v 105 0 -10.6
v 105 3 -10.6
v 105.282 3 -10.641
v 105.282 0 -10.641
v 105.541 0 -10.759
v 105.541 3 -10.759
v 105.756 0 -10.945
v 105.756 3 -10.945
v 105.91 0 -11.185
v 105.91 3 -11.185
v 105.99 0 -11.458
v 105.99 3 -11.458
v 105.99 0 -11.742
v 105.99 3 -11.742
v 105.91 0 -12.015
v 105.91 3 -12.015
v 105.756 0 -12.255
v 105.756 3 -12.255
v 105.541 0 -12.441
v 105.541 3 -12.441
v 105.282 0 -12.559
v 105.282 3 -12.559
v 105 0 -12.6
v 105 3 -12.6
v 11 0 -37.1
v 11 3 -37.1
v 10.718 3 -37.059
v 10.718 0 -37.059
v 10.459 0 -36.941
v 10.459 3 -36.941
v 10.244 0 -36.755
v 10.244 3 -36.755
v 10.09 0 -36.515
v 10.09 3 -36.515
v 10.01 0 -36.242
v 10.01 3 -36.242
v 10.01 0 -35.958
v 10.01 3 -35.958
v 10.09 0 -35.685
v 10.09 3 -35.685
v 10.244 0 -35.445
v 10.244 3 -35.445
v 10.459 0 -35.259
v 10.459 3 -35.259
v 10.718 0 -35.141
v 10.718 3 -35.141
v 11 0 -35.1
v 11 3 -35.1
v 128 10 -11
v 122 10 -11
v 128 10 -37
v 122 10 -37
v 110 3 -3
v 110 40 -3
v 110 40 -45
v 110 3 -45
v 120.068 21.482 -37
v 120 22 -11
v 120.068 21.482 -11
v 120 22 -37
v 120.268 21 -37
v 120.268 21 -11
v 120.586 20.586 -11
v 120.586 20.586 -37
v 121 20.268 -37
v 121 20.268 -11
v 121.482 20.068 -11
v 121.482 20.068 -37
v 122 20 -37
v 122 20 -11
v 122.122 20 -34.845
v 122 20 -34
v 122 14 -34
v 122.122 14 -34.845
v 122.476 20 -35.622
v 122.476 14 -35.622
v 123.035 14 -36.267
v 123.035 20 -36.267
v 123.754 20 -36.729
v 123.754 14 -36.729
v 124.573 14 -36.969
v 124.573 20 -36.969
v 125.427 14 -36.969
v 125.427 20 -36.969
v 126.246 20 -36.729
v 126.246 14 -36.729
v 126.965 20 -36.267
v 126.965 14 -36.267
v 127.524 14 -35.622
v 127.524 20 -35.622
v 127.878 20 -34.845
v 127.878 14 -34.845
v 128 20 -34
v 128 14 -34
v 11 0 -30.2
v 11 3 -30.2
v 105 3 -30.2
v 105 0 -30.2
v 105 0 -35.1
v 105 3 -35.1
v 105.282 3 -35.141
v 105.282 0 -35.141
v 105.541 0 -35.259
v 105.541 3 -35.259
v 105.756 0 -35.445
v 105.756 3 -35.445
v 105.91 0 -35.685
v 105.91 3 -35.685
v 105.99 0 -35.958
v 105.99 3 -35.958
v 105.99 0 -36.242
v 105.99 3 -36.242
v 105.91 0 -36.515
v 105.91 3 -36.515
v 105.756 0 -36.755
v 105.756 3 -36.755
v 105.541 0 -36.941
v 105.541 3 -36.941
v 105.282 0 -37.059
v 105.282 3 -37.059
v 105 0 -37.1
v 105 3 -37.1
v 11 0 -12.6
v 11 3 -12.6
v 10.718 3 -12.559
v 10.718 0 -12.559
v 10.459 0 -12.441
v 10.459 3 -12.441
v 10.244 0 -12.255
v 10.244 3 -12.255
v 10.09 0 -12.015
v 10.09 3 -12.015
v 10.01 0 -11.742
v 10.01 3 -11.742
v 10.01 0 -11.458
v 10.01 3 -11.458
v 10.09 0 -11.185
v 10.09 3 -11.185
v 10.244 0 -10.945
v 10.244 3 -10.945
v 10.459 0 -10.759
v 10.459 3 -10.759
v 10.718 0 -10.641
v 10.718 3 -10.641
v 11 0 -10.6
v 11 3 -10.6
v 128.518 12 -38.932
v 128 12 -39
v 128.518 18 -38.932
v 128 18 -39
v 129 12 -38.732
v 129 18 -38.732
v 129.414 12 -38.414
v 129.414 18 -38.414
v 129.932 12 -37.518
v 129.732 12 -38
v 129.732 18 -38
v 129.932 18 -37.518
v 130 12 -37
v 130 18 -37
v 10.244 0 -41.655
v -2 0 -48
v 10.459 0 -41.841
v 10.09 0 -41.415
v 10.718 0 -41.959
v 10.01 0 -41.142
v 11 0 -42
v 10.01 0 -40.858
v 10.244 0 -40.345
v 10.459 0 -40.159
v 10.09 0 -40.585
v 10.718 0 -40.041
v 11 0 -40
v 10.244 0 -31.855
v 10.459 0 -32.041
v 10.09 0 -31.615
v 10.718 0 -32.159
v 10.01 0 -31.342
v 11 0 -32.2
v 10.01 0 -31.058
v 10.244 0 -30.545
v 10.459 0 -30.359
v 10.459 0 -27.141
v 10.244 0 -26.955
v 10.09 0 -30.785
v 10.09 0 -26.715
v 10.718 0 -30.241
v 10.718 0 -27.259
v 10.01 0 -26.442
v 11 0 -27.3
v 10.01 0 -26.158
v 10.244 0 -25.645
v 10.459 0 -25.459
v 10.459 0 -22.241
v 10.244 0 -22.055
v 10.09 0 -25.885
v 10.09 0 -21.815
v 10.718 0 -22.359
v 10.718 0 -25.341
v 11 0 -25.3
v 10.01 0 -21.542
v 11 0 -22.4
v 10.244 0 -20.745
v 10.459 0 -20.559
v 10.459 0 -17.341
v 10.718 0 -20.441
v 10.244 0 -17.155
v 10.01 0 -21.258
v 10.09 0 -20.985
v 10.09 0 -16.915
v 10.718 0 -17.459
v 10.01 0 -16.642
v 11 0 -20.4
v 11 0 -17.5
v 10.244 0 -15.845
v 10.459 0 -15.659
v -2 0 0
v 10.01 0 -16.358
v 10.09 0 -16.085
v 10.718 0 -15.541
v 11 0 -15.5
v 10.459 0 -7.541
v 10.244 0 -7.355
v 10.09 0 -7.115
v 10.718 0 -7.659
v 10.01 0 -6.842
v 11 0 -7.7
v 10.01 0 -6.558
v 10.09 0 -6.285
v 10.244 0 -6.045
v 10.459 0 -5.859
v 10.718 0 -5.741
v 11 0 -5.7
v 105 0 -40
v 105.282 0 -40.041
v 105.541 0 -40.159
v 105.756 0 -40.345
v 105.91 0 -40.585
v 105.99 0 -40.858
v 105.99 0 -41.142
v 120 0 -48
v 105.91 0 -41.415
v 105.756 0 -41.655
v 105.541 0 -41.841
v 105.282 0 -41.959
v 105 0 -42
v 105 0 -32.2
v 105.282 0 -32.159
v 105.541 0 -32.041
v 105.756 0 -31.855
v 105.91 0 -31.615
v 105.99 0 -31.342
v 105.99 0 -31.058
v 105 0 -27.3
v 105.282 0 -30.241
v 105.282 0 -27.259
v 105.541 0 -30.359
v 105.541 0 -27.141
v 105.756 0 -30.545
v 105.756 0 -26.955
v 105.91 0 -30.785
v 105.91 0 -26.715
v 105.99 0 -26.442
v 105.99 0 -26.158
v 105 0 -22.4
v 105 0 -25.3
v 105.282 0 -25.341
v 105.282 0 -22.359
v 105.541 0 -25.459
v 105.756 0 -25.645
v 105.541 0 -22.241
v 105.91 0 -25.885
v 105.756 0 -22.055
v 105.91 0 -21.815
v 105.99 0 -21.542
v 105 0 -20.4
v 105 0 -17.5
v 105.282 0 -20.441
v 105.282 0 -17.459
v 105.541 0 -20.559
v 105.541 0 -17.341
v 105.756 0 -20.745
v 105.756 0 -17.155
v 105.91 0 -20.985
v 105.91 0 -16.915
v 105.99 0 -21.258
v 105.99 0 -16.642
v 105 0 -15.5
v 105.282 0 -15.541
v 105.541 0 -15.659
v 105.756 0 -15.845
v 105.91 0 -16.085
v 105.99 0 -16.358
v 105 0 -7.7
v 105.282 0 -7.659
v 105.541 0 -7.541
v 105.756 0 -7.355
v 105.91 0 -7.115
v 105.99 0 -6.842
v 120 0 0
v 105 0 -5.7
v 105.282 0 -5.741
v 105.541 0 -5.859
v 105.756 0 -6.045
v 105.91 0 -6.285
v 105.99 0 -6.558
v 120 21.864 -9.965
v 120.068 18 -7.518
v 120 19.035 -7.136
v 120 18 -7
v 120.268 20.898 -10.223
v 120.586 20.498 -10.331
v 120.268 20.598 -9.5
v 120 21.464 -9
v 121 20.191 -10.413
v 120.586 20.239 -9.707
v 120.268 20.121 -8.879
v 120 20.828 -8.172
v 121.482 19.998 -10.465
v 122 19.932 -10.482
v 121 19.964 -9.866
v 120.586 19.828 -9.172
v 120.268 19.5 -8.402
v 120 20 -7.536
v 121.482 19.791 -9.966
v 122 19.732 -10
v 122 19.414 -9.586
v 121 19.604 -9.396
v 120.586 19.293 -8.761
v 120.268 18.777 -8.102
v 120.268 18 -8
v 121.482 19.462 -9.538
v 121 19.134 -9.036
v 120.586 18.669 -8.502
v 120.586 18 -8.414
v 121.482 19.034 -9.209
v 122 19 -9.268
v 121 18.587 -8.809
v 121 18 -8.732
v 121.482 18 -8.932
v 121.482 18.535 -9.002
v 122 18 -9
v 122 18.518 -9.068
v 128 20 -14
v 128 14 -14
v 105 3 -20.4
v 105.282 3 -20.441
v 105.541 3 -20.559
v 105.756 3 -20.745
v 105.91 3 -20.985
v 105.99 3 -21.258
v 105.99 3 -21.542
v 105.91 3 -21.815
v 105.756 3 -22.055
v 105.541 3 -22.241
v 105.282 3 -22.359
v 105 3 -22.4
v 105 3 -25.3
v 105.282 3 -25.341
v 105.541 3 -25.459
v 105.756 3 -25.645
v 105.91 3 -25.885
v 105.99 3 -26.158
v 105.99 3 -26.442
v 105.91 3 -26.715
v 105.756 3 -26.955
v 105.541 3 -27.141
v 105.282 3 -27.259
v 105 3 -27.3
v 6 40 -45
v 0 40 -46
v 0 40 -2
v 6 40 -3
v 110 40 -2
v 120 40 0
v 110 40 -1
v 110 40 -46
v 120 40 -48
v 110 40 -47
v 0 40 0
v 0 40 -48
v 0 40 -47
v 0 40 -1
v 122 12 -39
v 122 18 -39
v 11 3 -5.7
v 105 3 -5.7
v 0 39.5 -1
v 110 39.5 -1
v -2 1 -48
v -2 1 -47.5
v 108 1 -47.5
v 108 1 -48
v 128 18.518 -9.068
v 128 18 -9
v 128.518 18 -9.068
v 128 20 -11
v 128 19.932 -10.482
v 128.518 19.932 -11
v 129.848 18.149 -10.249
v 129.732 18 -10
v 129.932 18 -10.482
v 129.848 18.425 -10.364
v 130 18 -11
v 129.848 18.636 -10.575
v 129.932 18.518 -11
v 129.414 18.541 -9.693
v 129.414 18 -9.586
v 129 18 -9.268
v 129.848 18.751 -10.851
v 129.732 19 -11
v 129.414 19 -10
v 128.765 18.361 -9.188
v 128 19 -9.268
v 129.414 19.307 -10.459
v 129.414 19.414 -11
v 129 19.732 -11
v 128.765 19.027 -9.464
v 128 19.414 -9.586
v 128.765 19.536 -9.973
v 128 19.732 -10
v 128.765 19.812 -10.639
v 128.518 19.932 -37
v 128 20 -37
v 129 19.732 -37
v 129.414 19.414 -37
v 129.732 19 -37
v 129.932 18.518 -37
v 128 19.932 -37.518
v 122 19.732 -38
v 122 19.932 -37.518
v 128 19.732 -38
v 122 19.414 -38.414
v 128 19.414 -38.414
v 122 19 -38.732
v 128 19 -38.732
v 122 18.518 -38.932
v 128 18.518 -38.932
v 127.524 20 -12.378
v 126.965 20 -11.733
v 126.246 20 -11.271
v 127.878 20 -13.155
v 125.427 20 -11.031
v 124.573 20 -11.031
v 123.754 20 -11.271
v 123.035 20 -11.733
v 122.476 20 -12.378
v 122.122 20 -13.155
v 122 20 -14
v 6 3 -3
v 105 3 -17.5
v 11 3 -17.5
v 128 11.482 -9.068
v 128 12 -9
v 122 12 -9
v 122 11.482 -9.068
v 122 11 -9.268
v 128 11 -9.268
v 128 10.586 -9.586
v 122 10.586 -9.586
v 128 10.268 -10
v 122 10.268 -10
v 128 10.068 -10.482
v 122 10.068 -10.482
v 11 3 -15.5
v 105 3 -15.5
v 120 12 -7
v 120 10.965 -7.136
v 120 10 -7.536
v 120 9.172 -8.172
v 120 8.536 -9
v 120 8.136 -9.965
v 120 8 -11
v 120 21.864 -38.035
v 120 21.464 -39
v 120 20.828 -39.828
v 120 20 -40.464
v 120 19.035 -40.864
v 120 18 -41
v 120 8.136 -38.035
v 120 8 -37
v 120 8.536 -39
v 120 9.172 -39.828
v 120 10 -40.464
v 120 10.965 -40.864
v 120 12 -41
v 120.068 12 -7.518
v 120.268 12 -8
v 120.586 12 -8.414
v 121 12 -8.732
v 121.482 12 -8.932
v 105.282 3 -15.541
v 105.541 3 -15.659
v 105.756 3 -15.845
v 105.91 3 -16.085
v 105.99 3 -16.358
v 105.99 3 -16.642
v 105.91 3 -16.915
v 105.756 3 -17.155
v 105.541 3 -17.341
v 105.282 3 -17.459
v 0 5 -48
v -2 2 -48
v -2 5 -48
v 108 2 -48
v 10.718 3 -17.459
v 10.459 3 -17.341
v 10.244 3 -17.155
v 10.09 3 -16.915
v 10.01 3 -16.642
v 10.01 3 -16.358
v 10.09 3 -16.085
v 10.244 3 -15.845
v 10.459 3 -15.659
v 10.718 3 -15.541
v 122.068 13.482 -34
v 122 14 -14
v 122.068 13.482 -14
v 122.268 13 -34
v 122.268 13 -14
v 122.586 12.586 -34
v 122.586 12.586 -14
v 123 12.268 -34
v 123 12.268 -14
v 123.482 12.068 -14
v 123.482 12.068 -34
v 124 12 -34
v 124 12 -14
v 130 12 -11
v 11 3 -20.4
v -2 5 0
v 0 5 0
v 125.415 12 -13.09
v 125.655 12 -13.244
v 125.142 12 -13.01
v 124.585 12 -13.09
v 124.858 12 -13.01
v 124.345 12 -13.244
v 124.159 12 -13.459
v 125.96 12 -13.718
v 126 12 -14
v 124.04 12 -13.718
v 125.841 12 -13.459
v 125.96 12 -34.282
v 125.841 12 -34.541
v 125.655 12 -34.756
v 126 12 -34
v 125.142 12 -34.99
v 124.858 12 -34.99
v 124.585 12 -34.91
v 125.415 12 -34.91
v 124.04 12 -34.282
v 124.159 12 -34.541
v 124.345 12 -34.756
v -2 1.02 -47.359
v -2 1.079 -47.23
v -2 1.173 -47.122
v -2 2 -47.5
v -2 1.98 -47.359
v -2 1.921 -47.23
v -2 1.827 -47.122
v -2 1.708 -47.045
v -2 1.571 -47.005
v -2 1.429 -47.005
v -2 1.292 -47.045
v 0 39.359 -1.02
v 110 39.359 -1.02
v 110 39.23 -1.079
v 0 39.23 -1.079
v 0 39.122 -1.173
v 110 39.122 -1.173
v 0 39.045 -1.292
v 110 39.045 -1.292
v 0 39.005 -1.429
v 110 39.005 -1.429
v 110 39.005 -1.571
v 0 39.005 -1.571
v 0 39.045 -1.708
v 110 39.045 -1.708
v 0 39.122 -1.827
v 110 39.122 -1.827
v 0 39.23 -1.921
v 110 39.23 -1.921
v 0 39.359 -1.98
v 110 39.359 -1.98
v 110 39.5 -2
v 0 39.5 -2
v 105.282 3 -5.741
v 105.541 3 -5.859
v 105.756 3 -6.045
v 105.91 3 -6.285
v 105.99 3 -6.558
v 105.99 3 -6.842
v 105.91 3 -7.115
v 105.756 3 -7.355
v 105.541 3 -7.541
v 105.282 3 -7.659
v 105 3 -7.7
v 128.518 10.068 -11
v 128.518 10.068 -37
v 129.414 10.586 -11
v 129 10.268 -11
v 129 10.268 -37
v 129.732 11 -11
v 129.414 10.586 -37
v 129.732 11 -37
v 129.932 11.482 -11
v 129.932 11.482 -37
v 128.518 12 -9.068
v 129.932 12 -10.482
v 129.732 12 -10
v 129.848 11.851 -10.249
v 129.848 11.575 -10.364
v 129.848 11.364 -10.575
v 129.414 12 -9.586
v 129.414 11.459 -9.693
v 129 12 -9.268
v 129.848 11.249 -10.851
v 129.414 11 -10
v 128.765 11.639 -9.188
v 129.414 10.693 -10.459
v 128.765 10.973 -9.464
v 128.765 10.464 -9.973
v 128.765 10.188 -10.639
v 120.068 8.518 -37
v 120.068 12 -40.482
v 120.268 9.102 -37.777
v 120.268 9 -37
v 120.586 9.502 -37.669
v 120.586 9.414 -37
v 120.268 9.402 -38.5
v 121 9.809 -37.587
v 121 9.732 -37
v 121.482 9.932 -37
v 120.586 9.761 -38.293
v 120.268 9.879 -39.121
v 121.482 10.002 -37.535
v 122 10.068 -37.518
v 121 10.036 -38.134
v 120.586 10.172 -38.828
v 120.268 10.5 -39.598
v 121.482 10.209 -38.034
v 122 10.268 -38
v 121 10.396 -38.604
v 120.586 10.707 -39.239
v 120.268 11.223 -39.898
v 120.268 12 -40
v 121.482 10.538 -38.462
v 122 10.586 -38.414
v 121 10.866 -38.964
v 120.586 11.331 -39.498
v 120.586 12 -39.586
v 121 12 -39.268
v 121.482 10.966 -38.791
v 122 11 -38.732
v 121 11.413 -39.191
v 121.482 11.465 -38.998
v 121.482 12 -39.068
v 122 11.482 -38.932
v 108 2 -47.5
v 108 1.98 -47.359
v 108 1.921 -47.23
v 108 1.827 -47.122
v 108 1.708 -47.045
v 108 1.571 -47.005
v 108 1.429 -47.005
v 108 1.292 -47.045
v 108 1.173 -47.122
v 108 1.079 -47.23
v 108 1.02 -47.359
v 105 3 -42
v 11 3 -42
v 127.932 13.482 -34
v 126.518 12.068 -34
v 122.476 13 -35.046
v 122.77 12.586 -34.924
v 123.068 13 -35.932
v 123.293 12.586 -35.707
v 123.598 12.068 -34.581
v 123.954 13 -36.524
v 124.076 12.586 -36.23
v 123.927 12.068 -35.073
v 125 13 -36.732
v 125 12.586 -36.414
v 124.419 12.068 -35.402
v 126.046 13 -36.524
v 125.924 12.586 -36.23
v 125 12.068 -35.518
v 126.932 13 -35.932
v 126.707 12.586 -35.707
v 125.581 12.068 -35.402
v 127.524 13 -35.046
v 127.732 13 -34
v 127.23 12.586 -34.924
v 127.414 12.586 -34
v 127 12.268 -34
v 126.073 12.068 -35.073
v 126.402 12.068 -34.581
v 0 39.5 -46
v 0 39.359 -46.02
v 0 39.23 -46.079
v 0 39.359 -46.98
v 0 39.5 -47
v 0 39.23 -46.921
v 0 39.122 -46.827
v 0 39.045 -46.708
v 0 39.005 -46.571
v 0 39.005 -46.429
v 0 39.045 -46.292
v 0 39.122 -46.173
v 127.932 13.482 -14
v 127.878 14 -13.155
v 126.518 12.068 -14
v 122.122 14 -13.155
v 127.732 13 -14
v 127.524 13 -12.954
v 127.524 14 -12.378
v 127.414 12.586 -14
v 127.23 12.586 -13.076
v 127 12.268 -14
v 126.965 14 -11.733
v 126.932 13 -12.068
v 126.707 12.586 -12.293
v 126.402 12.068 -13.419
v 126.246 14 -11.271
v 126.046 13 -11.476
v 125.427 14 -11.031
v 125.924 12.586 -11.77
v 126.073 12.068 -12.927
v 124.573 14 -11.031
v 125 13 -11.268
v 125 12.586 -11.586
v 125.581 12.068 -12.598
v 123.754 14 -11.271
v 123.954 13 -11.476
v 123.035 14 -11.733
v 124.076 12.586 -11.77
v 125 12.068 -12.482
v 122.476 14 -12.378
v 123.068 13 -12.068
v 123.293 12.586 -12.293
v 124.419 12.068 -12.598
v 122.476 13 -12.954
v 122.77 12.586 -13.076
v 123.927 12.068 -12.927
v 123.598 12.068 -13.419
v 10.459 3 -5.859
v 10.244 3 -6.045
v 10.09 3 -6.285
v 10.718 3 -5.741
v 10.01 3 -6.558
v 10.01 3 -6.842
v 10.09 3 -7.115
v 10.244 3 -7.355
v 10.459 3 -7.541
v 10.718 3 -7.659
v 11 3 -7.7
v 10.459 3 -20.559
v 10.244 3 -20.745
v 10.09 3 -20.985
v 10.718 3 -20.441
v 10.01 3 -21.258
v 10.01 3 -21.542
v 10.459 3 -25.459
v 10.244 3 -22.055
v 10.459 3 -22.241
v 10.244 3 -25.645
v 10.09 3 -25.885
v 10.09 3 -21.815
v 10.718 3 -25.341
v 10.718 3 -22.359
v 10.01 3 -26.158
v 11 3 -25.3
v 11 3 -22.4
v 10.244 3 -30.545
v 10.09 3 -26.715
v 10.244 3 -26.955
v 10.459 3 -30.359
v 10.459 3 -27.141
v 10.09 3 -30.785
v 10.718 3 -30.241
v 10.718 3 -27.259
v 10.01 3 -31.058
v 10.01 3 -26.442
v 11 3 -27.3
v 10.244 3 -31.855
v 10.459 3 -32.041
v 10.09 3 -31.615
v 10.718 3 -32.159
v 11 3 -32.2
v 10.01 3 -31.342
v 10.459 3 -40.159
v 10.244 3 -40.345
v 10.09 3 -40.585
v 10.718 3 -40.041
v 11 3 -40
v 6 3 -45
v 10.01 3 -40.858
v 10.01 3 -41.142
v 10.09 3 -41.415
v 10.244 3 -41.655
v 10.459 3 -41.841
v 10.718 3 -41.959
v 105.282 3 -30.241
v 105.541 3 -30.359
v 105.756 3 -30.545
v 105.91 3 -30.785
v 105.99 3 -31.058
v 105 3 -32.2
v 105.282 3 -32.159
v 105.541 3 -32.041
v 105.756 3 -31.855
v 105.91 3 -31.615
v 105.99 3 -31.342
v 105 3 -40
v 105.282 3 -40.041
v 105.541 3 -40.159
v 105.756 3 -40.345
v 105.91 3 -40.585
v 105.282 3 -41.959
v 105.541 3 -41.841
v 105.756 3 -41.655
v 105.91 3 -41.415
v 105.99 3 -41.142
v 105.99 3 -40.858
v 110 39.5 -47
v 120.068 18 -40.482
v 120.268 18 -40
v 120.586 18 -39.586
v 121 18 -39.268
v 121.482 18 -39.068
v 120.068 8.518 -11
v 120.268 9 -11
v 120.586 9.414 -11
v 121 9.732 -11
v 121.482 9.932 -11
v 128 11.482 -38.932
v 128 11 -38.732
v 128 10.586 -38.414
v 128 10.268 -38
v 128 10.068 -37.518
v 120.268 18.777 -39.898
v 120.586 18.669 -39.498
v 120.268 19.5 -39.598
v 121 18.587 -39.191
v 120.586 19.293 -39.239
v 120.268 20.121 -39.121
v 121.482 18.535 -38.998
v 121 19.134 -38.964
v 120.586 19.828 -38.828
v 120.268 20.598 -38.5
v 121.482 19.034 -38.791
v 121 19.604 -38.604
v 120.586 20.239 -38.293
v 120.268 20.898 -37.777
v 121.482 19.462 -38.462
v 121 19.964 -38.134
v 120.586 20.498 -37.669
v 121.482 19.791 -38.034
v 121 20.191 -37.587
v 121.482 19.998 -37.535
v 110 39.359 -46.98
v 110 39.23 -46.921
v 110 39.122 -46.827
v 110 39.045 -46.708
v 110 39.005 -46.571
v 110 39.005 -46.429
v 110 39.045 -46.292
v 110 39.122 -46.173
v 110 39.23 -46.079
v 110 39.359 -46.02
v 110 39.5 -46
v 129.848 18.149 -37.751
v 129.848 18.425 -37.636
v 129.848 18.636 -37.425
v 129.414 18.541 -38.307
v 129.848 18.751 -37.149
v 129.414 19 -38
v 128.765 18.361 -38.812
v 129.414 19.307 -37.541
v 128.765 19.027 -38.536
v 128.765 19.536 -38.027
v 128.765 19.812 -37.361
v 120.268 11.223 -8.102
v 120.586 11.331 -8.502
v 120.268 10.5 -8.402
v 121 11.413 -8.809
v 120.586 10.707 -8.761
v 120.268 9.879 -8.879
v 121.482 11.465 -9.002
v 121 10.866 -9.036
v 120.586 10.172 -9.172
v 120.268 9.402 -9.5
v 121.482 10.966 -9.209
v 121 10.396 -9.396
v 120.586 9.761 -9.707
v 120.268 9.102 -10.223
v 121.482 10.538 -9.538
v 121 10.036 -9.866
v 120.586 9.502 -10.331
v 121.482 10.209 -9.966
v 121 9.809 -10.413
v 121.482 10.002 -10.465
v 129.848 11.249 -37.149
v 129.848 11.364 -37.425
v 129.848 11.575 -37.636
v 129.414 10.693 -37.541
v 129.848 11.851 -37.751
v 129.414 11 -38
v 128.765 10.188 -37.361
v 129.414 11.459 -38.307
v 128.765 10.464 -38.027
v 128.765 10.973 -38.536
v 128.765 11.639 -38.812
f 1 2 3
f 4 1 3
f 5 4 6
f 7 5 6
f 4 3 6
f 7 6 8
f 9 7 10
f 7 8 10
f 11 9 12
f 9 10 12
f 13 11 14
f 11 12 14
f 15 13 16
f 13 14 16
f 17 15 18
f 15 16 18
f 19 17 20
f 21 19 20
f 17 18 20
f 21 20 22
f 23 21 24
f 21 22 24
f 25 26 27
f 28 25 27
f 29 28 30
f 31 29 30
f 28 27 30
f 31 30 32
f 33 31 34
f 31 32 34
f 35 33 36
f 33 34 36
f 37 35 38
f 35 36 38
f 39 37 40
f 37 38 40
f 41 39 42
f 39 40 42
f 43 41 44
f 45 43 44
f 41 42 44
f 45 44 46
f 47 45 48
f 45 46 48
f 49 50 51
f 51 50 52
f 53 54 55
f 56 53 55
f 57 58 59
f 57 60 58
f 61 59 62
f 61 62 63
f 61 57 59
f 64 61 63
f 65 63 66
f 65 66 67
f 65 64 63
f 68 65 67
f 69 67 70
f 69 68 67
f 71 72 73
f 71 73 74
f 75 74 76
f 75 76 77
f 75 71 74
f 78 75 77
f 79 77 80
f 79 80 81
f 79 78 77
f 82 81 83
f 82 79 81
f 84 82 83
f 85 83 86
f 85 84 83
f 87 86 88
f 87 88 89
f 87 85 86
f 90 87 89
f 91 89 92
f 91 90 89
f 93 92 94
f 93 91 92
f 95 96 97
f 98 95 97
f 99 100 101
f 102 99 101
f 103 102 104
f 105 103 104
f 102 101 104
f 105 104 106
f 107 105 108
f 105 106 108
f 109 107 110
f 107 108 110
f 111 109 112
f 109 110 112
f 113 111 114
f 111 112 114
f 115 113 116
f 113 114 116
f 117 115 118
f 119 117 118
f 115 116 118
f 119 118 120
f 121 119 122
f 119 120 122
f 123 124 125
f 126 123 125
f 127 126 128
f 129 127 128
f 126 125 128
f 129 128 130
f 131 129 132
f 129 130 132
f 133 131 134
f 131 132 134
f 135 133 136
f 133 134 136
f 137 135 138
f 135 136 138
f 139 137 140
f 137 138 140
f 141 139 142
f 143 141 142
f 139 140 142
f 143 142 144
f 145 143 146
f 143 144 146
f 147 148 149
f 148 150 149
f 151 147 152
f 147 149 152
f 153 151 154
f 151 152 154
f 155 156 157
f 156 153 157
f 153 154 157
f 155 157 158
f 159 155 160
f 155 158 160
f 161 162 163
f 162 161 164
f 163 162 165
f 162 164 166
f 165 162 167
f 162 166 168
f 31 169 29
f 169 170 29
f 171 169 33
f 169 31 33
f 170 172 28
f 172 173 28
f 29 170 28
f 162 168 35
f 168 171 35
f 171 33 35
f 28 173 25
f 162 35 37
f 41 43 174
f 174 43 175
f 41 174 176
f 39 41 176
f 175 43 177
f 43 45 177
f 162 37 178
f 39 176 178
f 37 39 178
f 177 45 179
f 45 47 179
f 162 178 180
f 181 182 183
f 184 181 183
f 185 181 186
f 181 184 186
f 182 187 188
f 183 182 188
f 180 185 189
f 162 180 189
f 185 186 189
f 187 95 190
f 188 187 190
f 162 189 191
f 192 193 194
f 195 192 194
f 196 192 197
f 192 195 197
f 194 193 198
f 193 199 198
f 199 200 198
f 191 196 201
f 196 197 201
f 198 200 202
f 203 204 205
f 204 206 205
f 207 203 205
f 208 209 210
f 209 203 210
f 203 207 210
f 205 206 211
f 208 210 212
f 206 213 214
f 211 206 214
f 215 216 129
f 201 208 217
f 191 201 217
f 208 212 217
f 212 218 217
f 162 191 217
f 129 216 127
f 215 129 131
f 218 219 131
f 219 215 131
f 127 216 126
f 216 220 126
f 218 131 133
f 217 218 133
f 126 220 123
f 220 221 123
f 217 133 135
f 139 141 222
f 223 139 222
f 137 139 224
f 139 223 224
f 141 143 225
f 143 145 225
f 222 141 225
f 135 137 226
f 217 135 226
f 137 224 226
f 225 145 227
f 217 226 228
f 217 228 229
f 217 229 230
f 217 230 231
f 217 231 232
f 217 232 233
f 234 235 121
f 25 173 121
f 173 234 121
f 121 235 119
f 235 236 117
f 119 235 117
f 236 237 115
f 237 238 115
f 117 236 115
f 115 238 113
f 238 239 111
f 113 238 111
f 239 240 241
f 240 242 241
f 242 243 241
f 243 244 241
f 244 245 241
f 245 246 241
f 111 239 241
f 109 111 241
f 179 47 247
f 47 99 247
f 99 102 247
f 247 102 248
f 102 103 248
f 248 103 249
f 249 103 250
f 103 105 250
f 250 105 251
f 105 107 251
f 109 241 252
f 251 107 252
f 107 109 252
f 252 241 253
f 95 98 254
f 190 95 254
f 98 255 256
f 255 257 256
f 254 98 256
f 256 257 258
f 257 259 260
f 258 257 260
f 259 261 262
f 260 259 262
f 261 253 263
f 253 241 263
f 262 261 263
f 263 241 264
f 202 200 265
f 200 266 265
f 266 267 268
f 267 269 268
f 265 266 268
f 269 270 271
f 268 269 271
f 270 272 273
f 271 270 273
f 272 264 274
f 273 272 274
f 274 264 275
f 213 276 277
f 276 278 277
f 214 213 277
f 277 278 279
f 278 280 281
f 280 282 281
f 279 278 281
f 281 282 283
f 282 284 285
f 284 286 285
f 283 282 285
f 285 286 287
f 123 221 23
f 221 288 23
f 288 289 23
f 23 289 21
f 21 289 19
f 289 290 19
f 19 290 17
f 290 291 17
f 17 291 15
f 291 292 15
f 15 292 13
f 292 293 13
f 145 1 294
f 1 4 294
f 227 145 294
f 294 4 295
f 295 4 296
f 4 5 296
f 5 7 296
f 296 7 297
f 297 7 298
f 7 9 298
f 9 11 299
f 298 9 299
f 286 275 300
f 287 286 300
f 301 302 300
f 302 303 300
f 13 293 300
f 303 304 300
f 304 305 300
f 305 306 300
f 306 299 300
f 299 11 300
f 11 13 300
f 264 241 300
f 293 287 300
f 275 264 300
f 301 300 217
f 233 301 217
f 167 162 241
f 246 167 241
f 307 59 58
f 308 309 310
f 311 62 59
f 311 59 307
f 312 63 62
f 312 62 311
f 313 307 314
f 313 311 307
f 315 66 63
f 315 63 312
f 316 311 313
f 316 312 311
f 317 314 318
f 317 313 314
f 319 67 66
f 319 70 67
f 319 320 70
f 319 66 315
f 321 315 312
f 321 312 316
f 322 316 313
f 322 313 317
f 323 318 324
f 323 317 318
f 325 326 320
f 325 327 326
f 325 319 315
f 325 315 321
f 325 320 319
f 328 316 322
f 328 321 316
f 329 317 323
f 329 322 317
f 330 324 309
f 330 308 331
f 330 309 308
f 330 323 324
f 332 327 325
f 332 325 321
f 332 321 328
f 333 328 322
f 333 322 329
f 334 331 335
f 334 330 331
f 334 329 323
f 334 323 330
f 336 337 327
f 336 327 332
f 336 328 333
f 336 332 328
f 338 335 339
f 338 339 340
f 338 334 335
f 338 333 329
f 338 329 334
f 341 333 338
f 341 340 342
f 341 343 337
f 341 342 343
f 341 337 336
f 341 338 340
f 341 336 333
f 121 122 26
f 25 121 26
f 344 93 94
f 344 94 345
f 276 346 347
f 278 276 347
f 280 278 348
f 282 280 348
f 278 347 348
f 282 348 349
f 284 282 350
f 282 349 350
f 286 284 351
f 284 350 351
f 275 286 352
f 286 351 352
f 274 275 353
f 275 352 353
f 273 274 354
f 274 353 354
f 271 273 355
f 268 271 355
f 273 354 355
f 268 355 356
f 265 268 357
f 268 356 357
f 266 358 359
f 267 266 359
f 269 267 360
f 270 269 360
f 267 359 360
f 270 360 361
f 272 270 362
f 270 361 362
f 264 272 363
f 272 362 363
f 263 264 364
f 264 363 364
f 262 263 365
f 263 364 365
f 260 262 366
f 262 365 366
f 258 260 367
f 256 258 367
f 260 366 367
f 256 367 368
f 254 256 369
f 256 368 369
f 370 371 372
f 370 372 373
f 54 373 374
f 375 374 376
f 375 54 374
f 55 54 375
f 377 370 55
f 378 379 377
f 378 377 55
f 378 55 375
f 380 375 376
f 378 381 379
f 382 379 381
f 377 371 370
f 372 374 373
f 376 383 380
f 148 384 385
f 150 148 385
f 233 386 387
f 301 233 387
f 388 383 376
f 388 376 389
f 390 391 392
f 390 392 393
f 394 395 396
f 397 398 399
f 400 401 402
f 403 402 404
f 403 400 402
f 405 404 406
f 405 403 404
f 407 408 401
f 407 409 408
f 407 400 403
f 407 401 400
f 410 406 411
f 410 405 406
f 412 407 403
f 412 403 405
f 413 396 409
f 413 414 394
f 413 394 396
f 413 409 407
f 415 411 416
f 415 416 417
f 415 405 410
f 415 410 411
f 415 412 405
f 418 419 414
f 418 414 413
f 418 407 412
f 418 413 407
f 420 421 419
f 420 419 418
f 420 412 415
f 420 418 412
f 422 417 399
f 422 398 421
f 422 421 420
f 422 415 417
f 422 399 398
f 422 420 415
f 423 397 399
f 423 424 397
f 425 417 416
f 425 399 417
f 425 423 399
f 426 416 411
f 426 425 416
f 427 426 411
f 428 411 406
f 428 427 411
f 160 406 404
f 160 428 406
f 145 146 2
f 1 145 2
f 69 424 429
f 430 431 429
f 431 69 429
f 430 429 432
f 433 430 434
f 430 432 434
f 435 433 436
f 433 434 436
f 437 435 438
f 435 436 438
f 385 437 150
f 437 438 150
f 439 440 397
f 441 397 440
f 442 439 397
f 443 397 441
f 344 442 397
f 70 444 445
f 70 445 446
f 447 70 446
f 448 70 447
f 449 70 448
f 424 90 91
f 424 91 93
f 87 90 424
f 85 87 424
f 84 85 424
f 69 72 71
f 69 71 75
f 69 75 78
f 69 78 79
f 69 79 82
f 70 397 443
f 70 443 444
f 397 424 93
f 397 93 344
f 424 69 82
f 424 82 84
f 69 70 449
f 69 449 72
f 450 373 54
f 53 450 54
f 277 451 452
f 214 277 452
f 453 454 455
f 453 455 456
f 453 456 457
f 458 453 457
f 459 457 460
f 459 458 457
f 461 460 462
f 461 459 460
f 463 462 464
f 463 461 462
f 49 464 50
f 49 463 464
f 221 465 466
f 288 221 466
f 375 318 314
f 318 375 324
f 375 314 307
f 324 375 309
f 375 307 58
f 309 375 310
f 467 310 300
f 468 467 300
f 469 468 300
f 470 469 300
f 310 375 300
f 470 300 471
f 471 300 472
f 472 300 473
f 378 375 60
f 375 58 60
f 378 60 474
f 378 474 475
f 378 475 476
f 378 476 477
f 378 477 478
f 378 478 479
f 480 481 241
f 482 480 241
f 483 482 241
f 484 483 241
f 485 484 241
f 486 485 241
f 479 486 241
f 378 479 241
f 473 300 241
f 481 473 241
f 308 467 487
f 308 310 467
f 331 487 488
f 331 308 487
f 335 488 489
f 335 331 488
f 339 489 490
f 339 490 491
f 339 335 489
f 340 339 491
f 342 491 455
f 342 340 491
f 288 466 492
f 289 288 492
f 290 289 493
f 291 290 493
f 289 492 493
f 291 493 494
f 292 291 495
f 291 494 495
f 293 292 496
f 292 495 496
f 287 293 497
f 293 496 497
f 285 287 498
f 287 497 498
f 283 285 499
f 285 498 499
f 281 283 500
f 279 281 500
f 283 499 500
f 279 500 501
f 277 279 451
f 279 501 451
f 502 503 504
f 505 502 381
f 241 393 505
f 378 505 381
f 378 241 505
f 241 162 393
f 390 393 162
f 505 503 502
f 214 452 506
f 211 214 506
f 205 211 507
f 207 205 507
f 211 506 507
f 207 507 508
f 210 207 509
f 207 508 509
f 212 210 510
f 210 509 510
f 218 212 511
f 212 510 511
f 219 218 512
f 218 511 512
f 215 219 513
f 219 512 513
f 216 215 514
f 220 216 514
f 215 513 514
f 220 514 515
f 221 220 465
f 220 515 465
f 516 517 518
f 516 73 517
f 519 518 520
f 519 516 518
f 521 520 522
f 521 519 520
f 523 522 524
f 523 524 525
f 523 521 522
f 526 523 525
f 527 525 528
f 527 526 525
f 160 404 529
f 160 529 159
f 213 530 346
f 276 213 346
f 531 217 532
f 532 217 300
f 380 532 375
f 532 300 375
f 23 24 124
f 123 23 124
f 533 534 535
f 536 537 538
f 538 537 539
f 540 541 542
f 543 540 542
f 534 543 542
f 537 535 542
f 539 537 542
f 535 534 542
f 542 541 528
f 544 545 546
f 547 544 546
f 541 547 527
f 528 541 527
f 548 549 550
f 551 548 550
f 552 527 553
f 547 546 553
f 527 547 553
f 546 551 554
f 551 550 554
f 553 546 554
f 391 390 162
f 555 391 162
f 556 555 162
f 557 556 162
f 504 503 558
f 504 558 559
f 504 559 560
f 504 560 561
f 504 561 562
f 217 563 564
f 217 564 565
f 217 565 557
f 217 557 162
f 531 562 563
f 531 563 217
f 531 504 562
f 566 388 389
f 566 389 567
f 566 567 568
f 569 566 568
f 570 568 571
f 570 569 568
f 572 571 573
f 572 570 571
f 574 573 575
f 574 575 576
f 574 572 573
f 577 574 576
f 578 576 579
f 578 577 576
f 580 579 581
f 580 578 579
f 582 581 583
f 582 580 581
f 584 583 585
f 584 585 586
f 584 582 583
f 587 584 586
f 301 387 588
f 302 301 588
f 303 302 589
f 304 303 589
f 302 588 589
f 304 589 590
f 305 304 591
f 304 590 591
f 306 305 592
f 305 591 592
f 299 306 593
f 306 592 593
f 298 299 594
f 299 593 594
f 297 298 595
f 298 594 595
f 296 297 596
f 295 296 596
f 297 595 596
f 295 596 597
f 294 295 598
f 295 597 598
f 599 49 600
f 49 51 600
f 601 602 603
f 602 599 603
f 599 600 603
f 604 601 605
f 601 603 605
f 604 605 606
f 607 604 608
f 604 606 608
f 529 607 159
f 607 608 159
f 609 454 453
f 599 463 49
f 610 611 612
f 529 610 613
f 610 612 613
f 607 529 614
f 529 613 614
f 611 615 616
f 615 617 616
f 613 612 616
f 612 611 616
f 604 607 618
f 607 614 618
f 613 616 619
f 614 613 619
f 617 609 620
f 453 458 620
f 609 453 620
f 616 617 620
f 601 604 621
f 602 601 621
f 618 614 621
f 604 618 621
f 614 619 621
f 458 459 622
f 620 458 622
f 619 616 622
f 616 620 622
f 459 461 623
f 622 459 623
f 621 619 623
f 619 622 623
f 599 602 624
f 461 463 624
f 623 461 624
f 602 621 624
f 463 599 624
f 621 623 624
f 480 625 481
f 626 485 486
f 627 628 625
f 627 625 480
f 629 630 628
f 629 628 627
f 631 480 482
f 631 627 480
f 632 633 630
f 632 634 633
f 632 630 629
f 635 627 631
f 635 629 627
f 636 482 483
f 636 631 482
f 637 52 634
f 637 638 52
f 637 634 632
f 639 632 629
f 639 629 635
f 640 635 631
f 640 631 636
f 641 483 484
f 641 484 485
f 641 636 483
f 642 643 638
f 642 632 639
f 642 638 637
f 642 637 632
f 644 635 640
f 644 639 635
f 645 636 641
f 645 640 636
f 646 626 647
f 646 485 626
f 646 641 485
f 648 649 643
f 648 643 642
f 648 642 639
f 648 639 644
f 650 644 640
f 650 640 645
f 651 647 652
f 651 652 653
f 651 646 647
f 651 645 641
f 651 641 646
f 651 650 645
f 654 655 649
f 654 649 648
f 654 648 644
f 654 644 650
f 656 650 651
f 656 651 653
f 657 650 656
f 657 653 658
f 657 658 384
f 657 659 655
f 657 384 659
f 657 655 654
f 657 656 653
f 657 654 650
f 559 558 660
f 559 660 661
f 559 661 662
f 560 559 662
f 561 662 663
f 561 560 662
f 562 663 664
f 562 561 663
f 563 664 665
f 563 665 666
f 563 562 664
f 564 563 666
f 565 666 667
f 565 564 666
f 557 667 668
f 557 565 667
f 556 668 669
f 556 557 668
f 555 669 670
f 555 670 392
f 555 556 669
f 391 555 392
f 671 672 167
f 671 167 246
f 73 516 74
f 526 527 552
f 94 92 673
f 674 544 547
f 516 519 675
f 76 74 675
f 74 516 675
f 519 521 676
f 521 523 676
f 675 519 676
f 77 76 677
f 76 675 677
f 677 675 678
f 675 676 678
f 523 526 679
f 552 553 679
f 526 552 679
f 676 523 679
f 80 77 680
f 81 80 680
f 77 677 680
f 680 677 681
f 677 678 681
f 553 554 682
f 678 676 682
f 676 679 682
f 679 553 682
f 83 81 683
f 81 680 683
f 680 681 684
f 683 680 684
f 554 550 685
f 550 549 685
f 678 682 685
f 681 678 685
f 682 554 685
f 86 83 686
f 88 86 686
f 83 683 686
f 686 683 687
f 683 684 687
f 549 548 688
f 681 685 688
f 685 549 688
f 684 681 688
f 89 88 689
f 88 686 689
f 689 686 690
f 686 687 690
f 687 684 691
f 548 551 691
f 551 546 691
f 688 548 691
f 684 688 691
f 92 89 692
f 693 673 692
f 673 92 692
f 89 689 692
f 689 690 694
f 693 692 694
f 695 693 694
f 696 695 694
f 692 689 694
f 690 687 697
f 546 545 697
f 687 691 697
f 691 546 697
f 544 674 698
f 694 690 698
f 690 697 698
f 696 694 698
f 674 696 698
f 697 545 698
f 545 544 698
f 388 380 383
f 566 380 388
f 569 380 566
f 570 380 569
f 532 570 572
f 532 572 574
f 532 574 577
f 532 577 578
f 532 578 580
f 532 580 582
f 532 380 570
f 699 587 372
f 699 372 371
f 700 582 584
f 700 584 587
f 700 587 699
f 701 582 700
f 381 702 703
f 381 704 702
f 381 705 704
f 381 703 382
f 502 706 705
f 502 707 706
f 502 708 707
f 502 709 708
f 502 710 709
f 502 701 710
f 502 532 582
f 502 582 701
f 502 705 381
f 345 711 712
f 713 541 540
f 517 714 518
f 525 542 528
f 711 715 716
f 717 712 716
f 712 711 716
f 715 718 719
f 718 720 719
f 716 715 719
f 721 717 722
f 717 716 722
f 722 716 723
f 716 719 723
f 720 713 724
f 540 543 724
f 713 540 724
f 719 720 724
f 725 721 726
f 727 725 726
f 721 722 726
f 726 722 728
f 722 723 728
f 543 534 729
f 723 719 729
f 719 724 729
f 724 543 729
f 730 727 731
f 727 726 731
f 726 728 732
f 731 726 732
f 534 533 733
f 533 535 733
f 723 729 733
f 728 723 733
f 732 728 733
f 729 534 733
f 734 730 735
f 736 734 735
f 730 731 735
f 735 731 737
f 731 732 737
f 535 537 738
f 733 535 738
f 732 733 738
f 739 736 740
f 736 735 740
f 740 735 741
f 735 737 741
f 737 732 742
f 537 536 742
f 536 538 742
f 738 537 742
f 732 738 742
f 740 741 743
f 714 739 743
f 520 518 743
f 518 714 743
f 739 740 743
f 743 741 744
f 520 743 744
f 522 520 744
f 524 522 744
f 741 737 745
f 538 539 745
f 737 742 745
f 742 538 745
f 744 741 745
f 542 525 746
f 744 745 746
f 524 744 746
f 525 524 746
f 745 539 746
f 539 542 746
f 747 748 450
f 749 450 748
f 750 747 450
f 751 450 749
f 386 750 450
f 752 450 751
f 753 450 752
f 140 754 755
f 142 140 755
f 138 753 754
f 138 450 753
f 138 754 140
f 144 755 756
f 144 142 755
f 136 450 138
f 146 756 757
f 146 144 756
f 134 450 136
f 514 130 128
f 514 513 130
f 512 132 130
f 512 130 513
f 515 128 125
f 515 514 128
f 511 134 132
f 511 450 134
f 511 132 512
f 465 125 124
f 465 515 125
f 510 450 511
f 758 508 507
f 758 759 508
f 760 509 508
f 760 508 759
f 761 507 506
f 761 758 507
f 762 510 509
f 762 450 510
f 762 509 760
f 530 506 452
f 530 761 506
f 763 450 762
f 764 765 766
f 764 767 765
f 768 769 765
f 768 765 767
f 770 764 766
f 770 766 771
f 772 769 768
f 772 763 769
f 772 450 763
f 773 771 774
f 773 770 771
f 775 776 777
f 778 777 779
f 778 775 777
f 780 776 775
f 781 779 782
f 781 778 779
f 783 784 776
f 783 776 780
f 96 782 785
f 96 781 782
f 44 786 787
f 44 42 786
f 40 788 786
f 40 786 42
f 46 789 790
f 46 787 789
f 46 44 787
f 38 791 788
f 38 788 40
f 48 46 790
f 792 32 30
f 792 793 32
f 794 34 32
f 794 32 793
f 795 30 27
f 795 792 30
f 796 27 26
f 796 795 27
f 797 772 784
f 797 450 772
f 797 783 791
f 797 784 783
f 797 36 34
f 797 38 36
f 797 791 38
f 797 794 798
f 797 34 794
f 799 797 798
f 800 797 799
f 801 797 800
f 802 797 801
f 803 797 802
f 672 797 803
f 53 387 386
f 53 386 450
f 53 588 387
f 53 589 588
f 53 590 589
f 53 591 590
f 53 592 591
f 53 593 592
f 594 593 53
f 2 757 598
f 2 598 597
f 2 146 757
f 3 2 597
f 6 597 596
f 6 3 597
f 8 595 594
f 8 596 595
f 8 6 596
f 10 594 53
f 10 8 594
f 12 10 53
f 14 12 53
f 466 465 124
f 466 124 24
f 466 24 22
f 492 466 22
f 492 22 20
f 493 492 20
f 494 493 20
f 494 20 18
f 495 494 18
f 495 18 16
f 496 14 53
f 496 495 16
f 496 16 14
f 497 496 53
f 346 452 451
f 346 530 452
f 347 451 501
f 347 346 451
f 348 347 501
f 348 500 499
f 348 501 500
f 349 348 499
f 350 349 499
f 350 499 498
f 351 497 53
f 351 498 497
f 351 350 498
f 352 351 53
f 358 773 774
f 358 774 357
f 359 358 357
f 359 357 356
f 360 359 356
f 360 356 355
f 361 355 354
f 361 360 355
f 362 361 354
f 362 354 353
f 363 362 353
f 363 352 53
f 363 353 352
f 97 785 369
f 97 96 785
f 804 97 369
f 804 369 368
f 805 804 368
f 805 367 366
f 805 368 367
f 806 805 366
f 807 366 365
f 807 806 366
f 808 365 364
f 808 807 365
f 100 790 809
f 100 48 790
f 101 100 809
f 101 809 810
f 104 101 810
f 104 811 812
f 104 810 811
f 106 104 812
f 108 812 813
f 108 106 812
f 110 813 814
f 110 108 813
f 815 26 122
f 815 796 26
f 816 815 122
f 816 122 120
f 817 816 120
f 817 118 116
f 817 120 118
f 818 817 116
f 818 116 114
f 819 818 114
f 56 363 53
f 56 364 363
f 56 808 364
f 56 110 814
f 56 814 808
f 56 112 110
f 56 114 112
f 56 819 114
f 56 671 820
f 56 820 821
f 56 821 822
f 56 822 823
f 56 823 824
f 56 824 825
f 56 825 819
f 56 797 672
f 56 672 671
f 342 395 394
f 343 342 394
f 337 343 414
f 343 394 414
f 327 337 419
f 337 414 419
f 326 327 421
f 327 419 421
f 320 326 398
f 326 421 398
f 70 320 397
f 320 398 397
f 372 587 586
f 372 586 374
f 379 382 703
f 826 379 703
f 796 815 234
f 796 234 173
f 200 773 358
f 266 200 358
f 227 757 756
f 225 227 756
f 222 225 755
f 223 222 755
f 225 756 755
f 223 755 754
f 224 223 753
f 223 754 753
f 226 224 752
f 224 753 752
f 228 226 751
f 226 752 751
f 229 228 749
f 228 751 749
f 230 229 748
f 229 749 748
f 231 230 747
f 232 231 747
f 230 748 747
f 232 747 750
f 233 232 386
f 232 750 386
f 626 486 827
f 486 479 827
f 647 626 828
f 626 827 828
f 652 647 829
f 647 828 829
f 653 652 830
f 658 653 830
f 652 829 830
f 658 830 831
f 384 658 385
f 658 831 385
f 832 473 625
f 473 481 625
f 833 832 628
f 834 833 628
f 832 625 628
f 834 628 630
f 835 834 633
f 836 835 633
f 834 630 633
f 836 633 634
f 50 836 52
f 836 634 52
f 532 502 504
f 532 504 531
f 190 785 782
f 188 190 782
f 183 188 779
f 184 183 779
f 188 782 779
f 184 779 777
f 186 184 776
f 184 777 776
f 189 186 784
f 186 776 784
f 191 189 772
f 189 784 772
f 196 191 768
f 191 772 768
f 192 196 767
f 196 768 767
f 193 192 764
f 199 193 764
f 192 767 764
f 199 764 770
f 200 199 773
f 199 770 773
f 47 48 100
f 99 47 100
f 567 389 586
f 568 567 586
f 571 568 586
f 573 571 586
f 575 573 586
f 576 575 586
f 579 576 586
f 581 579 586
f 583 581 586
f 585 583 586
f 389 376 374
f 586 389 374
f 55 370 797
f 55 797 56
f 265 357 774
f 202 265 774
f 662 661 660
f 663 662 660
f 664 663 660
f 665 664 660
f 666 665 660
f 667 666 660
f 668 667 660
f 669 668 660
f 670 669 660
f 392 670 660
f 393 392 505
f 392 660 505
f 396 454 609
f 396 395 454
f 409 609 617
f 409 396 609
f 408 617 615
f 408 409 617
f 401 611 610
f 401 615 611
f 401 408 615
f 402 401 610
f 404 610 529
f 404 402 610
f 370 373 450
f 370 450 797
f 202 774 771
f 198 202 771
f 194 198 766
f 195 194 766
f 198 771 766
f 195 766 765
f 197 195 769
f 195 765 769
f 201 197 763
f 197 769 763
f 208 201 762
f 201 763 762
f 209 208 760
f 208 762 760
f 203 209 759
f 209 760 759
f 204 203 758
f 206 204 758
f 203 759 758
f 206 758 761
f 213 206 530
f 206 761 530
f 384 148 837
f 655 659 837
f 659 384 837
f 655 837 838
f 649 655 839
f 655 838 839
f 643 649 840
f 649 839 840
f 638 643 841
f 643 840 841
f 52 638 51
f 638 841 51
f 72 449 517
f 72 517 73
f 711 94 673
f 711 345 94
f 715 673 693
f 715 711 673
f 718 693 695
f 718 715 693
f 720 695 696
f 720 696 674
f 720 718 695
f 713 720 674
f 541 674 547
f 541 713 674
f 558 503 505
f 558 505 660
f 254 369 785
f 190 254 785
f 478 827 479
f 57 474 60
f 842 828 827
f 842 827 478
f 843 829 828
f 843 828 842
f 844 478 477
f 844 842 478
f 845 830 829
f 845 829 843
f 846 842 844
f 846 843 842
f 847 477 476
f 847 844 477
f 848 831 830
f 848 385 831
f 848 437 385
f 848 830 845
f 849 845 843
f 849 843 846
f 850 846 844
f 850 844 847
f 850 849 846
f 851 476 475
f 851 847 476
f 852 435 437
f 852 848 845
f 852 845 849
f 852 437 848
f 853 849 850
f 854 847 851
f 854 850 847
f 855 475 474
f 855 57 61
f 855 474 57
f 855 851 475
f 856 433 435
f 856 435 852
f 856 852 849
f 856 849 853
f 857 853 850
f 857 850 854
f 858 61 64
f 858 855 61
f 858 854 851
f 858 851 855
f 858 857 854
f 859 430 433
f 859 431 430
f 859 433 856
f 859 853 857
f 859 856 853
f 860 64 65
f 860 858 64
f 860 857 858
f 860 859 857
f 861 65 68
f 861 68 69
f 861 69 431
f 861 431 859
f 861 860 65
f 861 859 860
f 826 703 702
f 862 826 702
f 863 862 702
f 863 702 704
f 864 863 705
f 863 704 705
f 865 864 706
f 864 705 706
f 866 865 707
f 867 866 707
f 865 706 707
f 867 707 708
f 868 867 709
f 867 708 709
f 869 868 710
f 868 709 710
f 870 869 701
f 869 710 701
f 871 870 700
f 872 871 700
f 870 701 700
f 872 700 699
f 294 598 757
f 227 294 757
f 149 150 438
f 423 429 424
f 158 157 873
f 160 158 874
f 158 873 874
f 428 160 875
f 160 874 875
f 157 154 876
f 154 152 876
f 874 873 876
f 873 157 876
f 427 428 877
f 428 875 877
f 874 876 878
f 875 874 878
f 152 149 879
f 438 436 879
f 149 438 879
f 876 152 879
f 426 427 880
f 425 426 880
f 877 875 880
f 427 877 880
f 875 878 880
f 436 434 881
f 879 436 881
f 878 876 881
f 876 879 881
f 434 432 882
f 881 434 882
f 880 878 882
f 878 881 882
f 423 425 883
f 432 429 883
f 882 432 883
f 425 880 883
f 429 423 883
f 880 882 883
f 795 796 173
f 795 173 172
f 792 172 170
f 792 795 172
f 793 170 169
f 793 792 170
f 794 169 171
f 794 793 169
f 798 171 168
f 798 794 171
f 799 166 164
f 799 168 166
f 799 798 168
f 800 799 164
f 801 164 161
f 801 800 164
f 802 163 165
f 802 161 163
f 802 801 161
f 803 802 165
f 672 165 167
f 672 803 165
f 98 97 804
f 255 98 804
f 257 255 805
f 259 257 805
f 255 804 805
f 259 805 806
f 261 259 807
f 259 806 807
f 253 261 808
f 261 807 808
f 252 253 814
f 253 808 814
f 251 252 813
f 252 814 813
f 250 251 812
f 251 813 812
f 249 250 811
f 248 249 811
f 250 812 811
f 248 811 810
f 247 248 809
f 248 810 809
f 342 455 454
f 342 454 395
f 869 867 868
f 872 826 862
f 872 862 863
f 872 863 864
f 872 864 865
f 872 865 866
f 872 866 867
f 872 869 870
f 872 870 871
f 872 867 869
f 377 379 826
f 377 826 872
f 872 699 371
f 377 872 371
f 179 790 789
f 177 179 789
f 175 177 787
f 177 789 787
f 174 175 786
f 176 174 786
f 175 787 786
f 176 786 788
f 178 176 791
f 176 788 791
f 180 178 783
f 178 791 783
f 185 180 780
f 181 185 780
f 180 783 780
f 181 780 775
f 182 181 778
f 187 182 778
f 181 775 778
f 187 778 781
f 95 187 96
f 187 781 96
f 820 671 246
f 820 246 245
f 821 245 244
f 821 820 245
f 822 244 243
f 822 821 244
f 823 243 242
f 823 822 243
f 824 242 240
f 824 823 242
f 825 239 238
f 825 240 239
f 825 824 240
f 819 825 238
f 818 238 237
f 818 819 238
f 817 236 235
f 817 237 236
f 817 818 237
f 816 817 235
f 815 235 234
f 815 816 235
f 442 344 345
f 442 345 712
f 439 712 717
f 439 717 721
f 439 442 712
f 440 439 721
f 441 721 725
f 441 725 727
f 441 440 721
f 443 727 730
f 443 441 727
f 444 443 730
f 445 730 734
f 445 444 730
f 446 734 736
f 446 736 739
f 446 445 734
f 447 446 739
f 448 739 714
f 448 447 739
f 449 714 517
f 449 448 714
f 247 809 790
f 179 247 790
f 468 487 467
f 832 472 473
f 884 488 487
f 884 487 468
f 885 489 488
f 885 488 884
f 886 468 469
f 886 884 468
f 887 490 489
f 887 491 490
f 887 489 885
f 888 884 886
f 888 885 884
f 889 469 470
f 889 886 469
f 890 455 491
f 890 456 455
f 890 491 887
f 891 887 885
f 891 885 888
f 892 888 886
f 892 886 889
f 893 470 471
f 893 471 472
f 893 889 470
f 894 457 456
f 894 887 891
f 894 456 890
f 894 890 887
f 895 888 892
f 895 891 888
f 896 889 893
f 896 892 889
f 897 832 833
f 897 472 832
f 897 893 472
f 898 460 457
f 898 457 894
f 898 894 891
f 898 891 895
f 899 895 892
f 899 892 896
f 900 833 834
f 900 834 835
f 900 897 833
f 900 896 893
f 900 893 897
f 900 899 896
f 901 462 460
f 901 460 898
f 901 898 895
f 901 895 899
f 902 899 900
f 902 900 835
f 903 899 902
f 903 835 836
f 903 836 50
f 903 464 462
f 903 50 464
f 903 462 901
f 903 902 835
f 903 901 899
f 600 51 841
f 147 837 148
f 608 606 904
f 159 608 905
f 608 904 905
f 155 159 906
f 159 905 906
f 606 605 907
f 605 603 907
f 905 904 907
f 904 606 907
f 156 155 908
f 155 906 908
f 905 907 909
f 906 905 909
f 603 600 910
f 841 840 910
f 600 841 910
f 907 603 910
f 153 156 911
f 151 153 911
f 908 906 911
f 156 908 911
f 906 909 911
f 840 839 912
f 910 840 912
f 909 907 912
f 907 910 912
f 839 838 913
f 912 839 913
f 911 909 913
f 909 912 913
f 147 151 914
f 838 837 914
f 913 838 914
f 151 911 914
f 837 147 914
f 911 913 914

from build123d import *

# Parameters (mm, degrees)
SKETCH1_W           = 120
SKETCH1_H           = 48
BOSS_EXTRUDE1_DEPTH = 40
SKETCH3_W           = 104
SKETCH3_H           = 42
CUT_EXTRUDE1_DEPTH  = 37
CUT_EXTRUDE2_DEPTH  = 37
CUT_EXTRUDE4_DEPTH  = 110
SKETCH10_W          = 48
SKETCH10_H          = 5
BOSS_EXTRUDE3_DEPTH = 2
SKETCH11_W          = 30
SKETCH11_H          = 10
BOSS_EXTRUDE4_DEPTH = 10
CUT_EXTRUDE6_DEPTH  = 8
FILLET1_R           = 2
CUT_EXTRUDE5_DEPTH  = 110


with BuildPart() as part:
    # Sketch1 → Boss-Extrude1 (new body)
    with BuildSketch(Plane(origin=(0, 0, 0), x_dir=(1, 0, 0), z_dir=(0, 1, 0))):
        with Locations((60, 24)):
            Rectangle(SKETCH1_W, SKETCH1_H)
    extrude(amount=BOSS_EXTRUDE1_DEPTH)

    # Sketch3 → Cut-Extrude1 (cut)
    with BuildSketch(Plane(origin=(0, 40, 0), x_dir=(1, 0, 0), z_dir=(0, 1, 0))):
        with Locations((58, 24)):
            Rectangle(SKETCH3_W, SKETCH3_H)
    extrude(amount=-CUT_EXTRUDE1_DEPTH, mode=Mode.SUBTRACT)

    # Sketch5 → Cut-Extrude2 (cut)
    with BuildSketch(Plane(origin=(0, 3, 0), x_dir=(1, 0, 0), z_dir=(0, 1, 0))):
        with BuildLine():
            Line((11, 42), (105, 42))
            ThreePointArc((105, 42), (106, 41), (105, 40))
            Line((105, 40), (11, 40))
            ThreePointArc((11, 40), (10, 41), (11, 42))
        make_face()
        with BuildLine():
            Line((11, 35.1), (105, 35.1))
            ThreePointArc((105, 35.1), (106, 36.1), (105, 37.1))
            Line((105, 37.1), (11, 37.1))
            ThreePointArc((11, 37.1), (10, 36.1), (11, 35.1))
        make_face()
        with BuildLine():
            Line((11, 30.2), (105, 30.2))
            ThreePointArc((105, 30.2), (106, 31.2), (105, 32.2))
            Line((105, 32.2), (11, 32.2))
            ThreePointArc((11, 32.2), (10, 31.2), (11, 30.2))
        make_face()
        with BuildLine():
            Line((11, 25.3), (105, 25.3))
            ThreePointArc((105, 25.3), (106, 26.3), (105, 27.3))
            Line((105, 27.3), (11, 27.3))
            ThreePointArc((11, 27.3), (10, 26.3), (11, 25.3))
        make_face()
        with BuildLine():
            Line((11, 20.4), (105, 20.4))
            ThreePointArc((105, 20.4), (106, 21.4), (105, 22.4))
            Line((105, 22.4), (11, 22.4))
            ThreePointArc((11, 22.4), (10, 21.4), (11, 20.4))
        make_face()
        with BuildLine():
            Line((11, 15.5), (105, 15.5))
            ThreePointArc((105, 15.5), (106, 16.5), (105, 17.5))
            Line((105, 17.5), (11, 17.5))
            ThreePointArc((11, 17.5), (10, 16.5), (11, 15.5))
        make_face()
        with BuildLine():
            Line((11, 10.6), (105, 10.6))
            ThreePointArc((105, 10.6), (106, 11.6), (105, 12.6))
            Line((105, 12.6), (11, 12.6))
            ThreePointArc((11, 12.6), (10, 11.6), (11, 10.6))
        make_face()
        with BuildLine():
            Line((11, 5.7), (105, 5.7))
            ThreePointArc((105, 5.7), (106, 6.7), (105, 7.7))
            Line((105, 7.7), (11, 7.7))
            ThreePointArc((11, 7.7), (10, 6.7), (11, 5.7))
        make_face()
    extrude(amount=-CUT_EXTRUDE2_DEPTH, mode=Mode.SUBTRACT)

    # Sketch7 → Cut-Extrude4 (cut)
    with BuildSketch(Plane.ZY):
        with BuildLine():
            Line((-2, 39.5), (-2, 40.5))
            ThreePointArc((-2, 40.5), (-1.5, 41), (-1, 40.5))
            Line((-1, 40.5), (-1, 39.5))
            ThreePointArc((-1, 39.5), (-1.5, 39), (-2, 39.5))
        make_face()
    cut_extrude4 = extrude(amount=-CUT_EXTRUDE4_DEPTH, mode=Mode.SUBTRACT)

    # Mirror1: Cut-Extrude4 across plane
    add(cut_extrude4.mirror(Plane(origin=(0, 0, -24), x_dir=(1, 0, 0), z_dir=(0, 0, -1))), mode=Mode.SUBTRACT)

    # Sketch10 → Boss-Extrude3 (add)
    with BuildSketch(Plane.ZY):
        with Locations((-24, 2.5)):
            Rectangle(SKETCH10_W, SKETCH10_H)
    extrude(amount=BOSS_EXTRUDE3_DEPTH)

    # Sketch11 → Boss-Extrude4 (add)
    with BuildSketch(Plane(origin=(120, 0, 0), x_dir=(0, 0, -1), z_dir=(1, 0, 0))):
        with Locations((24, 15)):
            Rectangle(SKETCH11_W, SKETCH11_H)
    extrude(amount=BOSS_EXTRUDE4_DEPTH)

    # Sketch12 → Cut-Extrude6 (cut)
    with BuildSketch(Plane(origin=(0, 20, 0), x_dir=(1, 0, 0), z_dir=(0, 1, 0))):
        with BuildLine():
            Line((128, 34), (128, 14))
            ThreePointArc((128, 14), (125, 11), (122, 14))
            Line((122, 14), (122, 34))
            ThreePointArc((122, 34), (125, 37), (128, 34))
        make_face()
    extrude(amount=-CUT_EXTRUDE6_DEPTH, mode=Mode.SUBTRACT)

    # Fillet1
    fillet1_edges = [part.edges().sort_by_distance(p)[0] for p in [
        (120, 15, -9),
        (125, 20, -9),
        (120, 10, -24),
        (125, 10, -9),
        (120, 15, -39),
        (125, 10, -39),
        (120, 20, -24),
        (125, 20, -39),
        (130, 15, -9),
        (130, 10, -24),
        (130, 15, -39),
        (130, 20, -24),
        (125, 12, -37),
        (128, 12, -24),
        (125, 12, -11),
        (122, 12, -24),
    ]]
    fillet(fillet1_edges, radius=FILLET1_R - 0.0001)  # a hair under: the kernel refuses the full size

    # Sketch8 → Cut-Extrude5 (cut)
    with BuildSketch(Plane.ZY.offset(2)):
        with BuildLine():
            Line((-48.5, 2), (-47.5, 2))
            ThreePointArc((-47.5, 2), (-47, 1.5), (-47.5, 1))
            Line((-47.5, 1), (-48.5, 1))
            ThreePointArc((-48.5, 1), (-49, 1.5), (-48.5, 2))
        make_face()
    extrude(amount=-CUT_EXTRUDE5_DEPTH, mode=Mode.SUBTRACT)


solid = part.part
